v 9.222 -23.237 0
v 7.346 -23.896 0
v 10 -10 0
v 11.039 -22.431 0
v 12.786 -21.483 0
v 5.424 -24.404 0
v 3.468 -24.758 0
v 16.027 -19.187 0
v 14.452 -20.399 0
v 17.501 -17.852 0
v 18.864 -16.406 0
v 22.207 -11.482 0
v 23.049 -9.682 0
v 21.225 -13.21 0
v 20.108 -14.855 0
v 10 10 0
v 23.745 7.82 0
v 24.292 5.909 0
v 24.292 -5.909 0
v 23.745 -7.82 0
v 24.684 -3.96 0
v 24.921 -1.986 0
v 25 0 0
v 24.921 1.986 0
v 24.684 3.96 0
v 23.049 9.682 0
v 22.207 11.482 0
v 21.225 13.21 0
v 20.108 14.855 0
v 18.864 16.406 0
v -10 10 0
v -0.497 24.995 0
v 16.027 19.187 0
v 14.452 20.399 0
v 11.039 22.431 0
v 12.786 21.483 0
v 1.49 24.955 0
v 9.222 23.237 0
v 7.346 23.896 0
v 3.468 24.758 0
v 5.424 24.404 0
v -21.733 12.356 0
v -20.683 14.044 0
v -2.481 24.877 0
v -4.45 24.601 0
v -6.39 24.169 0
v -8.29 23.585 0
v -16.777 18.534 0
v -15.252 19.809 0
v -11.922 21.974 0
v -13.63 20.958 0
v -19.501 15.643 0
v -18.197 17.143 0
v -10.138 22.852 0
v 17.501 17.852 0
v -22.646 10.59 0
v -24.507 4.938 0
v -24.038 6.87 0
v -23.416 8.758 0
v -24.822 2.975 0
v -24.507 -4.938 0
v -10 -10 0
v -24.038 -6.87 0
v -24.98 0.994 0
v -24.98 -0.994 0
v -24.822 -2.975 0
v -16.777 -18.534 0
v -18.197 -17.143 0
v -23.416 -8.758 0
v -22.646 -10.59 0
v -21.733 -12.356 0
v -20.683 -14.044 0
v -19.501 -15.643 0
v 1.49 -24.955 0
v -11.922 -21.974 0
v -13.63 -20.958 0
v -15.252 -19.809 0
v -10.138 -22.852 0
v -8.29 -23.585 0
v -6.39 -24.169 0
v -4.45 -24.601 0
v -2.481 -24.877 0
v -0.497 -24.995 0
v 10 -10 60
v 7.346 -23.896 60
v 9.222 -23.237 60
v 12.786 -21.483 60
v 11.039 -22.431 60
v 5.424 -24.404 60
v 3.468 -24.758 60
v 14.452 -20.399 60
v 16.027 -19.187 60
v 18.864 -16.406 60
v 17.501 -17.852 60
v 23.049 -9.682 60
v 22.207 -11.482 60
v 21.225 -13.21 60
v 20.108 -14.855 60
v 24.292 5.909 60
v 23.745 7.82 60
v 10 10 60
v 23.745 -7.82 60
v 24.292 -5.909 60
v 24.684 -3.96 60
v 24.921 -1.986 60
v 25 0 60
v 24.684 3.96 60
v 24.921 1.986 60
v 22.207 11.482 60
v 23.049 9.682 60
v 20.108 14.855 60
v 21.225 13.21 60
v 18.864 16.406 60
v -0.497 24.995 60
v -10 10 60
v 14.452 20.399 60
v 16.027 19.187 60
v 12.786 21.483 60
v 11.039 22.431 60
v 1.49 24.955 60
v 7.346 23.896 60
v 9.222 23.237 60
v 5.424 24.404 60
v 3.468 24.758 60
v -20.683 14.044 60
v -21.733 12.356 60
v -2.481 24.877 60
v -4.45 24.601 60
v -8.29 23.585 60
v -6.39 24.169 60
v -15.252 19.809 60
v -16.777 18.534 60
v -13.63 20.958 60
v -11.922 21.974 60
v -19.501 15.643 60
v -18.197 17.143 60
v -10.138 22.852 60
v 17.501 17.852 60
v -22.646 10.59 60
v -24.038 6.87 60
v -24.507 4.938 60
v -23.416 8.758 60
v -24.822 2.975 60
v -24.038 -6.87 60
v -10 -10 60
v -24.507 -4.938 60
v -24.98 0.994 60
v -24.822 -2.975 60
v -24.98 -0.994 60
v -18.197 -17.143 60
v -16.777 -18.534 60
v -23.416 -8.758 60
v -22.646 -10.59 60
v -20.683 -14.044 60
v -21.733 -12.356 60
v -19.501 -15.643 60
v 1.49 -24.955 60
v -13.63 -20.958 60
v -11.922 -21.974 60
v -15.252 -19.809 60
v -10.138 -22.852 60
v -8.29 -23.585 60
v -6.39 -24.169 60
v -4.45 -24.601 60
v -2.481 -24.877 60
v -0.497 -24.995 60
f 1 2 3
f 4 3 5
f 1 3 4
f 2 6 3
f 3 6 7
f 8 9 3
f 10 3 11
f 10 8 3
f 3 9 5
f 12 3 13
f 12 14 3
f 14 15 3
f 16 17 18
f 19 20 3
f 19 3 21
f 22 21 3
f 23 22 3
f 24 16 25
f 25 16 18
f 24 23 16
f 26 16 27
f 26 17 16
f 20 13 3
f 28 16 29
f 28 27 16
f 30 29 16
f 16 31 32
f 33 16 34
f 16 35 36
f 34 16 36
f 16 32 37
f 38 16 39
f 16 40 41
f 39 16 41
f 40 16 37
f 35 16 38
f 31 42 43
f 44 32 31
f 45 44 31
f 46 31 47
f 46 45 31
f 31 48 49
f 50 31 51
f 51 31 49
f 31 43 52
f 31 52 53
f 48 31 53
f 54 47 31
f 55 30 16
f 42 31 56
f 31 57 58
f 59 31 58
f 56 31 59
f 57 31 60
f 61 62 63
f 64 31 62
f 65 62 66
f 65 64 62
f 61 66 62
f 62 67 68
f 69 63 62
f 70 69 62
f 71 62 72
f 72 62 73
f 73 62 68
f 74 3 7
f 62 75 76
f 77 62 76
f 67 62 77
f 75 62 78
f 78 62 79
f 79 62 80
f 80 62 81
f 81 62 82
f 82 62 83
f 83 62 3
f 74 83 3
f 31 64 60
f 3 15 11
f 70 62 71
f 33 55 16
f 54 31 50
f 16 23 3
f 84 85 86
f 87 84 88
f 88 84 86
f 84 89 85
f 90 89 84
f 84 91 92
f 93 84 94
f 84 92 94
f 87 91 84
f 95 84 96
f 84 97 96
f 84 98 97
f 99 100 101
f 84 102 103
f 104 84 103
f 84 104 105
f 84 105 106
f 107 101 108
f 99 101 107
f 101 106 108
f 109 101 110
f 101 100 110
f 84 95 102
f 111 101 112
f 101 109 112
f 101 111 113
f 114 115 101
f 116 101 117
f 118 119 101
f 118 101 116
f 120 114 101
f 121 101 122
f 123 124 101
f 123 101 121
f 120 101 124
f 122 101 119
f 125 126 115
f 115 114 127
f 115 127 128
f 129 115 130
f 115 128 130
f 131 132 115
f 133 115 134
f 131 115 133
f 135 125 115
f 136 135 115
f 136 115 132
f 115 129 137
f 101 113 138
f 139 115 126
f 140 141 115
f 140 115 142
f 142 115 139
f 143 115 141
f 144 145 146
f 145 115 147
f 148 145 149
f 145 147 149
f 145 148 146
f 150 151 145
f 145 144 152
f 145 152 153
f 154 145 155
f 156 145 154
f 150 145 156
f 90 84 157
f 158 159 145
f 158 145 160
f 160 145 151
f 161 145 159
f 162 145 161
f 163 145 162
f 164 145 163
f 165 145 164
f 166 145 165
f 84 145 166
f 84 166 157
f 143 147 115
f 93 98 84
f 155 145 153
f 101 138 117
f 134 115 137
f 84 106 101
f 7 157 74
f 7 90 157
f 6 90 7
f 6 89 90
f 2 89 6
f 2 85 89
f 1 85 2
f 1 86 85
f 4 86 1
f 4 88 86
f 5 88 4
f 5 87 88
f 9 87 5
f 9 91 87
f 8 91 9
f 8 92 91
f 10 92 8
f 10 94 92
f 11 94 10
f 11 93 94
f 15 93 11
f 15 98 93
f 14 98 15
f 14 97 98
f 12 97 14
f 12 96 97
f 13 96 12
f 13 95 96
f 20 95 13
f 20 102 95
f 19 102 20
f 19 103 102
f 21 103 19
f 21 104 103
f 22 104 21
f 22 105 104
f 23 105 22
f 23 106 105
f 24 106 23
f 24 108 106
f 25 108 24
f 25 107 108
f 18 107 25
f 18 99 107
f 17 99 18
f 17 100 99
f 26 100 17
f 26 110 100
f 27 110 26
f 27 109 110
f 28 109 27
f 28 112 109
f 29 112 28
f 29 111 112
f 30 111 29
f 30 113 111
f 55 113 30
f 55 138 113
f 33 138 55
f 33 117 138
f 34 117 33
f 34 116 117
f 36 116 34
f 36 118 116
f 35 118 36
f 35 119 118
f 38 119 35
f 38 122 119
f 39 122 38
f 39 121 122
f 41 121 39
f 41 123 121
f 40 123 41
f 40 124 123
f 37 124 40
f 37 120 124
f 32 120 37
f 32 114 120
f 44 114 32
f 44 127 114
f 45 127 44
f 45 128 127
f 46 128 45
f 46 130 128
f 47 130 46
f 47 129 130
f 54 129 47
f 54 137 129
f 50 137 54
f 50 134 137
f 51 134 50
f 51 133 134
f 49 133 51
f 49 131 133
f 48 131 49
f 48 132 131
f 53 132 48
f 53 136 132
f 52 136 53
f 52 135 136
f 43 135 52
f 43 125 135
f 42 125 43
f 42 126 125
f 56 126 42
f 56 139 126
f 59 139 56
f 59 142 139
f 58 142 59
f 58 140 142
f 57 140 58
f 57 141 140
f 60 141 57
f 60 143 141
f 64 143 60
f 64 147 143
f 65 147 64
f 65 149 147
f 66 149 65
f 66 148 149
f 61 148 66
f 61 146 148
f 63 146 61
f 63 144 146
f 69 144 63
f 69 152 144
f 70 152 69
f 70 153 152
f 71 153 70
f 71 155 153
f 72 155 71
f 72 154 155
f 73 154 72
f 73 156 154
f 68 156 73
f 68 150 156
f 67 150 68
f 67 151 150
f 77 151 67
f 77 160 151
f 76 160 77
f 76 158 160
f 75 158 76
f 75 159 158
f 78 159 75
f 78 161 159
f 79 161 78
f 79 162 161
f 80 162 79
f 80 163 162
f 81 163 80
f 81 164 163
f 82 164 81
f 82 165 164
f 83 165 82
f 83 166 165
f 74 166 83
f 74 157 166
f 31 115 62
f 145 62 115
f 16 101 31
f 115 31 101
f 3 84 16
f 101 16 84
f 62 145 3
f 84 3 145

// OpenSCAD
// Generated by Parametrix
ca_myPartB_faceFront_000 = [ [ 25.0000, 0.0000 ],[ 24.9210, 1.9863 ],[ 24.6844, 3.9600 ],[ 24.2917, 5.9086 ],[ 23.7455, 7.8199 ],[ 23.0491, 9.6818 ],[ 22.2071, 11.4824 ],[ 21.2246, 13.2105 ],[ 20.1079, 14.8550 ],[ 18.8641, 16.4056 ],[ 17.5011, 17.8525 ],[ 16.0273, 19.1866 ],[ 14.4523, 20.3993 ],[ 12.7859, 21.4830 ],[ 11.0386, 22.4310 ],[ 9.2216, 23.2371 ],[ 7.3463, 23.8963 ],[ 5.4245, 24.4044 ],[ 3.4684, 24.7582 ],[ 1.4904, 24.9555 ],[ -0.4971, 24.9951 ],[ -2.4813, 24.8766 ],[ -4.4499, 24.6008 ],[ -6.3904, 24.1695 ],[ -8.2905, 23.5853 ],[ -10.1381, 22.8521 ],[ -11.9217, 21.9744 ],[ -13.6299, 20.9577 ],[ -15.2519, 19.8086 ],[ -16.7775, 18.5342 ],[ -18.1970, 17.1426 ],[ -19.5014, 15.6427 ],[ -20.6826, 14.0439 ],[ -21.7330, 12.3562 ],[ -22.6460, 10.5905 ],[ -23.4158, 8.7578 ],[ -24.0376, 6.8697 ],[ -24.5074, 4.9382 ],[ -24.8223, 2.9755 ],[ -24.9802, 0.9939 ],[ -24.9802, -0.9939 ],[ -24.8223, -2.9755 ],[ -24.5074, -4.9382 ],[ -24.0376, -6.8697 ],[ -23.4158, -8.7578 ],[ -22.6460, -10.5905 ],[ -21.7330, -12.3562 ],[ -20.6826, -14.0439 ],[ -19.5014, -15.6427 ],[ -18.1970, -17.1426 ],[ -16.7775, -18.5342 ],[ -15.2519, -19.8086 ],[ -13.6299, -20.9577 ],[ -11.9217, -21.9744 ],[ -10.1381, -22.8521 ],[ -8.2905, -23.5853 ],[ -6.3904, -24.1695 ],[ -4.4499, -24.6008 ],[ -2.4813, -24.8766 ],[ -0.4971, -24.9951 ],[ 1.4904, -24.9555 ],[ 3.4684, -24.7582 ],[ 5.4245, -24.4044 ],[ 7.3463, -23.8963 ],[ 9.2216, -23.2371 ],[ 11.0386, -22.4310 ],[ 12.7859, -21.4830 ],[ 14.4523, -20.3993 ],[ 16.0273, -19.1866 ],[ 17.5011, -17.8525 ],[ 18.8641, -16.4056 ],[ 20.1079, -14.8550 ],[ 21.2246, -13.2105 ],[ 22.2071, -11.4824 ],[ 23.0491, -9.6818 ],[ 23.7455, -7.8199 ],[ 24.2917, -5.9086 ],[ 24.6844, -3.9600 ],[ 24.9210, -1.9863 ],[ 25.0000, 0.0000 ] ];
cb_myPartB_faceFront_000 = [  0, 1, 2, 3, 4, 5, 6, 7, 8, 9, 10, 11, 12, 13, 14, 15, 16, 17, 18, 19, 20, 21, 22, 23, 24, 25, 26, 27, 28, 29, 30, 31, 32, 33, 34, 35, 36, 37, 38, 39, 40, 41, 42, 43, 44, 45, 46, 47, 48, 49, 50, 51, 52, 53, 54, 55, 56, 57, 58, 59, 60, 61, 62, 63, 64, 65, 66, 67, 68, 69, 70, 71, 72, 73, 74, 75, 76, 77, 78, 79 ];
ca_myPartB_faceFront_001 = [ [ -10.0000, -10.0000 ],[ 10.0000, -10.0000 ],[ 10.0000, 10.0000 ],[ -10.0000, 10.0000 ],[ -10.0000, -10.0000 ] ];
cb_myPartB_faceFront_001 = [  80, 81, 82, 83, 84 ];
a_myPartB_faceFront = concat(ca_myPartB_faceFront_000, ca_myPartB_faceFront_001);
b_myPartB_faceFront = [cb_myPartB_faceFront_000, cb_myPartB_faceFront_001];
a_myPartB_faceSide = concat();
b_myPartB_faceSide = [];

module subpax_myPartB () {
	translate( [ 0, 0, 0 ])
		rotate( [ 0, 0, 0 ])
			   linear_extrude(height = 60) polygon(a_myPartB_faceFront, b_myPartB_faceFront);
}

module pax_myPartB () {
	subpax_myPartB();
}

pax_myPartB();
